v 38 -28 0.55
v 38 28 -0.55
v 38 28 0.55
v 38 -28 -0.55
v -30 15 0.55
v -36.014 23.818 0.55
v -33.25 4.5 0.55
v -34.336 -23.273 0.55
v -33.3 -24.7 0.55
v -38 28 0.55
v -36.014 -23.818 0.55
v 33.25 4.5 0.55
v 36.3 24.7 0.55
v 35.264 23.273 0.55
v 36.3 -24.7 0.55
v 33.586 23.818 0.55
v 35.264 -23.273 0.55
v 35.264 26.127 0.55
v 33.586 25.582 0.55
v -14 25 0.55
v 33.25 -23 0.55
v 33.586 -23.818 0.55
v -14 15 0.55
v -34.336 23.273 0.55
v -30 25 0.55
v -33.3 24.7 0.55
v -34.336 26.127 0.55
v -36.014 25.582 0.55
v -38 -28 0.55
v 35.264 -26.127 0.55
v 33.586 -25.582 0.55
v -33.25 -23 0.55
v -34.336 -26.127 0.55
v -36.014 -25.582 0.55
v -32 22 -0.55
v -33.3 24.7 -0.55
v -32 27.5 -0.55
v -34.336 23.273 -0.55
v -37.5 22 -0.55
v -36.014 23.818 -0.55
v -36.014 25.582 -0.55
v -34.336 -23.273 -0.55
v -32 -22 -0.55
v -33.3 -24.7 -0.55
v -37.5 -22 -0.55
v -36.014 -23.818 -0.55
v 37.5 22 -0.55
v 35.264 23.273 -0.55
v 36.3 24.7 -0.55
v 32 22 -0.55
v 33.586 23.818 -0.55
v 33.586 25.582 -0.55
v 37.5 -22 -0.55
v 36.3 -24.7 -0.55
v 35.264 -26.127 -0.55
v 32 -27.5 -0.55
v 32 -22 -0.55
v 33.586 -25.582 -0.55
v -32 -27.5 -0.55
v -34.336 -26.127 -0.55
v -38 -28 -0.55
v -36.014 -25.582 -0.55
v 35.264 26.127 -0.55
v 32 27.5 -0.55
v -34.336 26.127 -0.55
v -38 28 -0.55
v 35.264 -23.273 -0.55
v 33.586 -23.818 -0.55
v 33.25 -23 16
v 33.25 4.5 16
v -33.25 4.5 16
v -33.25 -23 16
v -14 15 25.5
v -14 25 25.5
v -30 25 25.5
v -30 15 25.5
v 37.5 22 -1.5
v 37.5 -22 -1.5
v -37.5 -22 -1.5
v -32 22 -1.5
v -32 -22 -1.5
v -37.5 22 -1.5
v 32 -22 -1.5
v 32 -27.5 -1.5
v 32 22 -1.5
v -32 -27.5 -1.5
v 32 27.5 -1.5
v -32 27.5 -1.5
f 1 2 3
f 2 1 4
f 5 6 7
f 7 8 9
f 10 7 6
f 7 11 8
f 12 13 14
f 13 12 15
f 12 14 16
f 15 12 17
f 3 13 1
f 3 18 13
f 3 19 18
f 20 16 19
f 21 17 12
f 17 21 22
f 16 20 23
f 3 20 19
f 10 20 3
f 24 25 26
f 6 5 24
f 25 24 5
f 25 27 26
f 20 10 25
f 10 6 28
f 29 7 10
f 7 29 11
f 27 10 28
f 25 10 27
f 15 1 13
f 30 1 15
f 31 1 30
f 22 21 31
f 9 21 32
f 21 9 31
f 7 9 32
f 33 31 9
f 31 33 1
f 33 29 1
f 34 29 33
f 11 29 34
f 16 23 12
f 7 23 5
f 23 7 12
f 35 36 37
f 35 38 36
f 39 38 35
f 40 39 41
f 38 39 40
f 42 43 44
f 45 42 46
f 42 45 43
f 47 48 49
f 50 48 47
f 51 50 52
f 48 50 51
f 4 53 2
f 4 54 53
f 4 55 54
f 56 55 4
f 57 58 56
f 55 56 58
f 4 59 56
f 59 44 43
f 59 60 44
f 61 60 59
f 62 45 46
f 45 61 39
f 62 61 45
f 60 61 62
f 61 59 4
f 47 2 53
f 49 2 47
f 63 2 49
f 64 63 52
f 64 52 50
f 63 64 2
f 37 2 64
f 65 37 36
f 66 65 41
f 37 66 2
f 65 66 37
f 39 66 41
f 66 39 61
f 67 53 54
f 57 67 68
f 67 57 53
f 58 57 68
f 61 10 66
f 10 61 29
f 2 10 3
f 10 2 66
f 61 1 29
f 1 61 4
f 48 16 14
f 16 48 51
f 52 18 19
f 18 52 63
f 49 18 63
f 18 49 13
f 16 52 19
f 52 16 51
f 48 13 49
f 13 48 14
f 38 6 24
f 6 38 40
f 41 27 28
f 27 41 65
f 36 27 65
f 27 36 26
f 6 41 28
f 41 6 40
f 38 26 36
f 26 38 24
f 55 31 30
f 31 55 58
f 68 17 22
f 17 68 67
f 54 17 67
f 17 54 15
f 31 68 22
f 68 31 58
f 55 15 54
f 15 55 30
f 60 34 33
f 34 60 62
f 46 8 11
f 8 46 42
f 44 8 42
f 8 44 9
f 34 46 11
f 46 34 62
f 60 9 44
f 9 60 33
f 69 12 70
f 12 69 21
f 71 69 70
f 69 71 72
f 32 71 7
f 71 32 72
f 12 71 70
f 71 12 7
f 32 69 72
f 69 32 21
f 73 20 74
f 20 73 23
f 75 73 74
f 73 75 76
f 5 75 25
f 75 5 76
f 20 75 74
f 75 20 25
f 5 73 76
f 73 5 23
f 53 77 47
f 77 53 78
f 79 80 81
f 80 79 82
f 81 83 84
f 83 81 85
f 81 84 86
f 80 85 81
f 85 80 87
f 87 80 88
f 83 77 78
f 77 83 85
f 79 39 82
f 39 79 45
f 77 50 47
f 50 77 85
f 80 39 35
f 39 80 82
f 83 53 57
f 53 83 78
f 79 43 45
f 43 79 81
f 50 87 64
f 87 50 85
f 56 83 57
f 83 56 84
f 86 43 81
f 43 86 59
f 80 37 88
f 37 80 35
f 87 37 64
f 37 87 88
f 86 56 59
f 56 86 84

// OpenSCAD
module hw_316() {
    //https://www.handsontec.com/dataspecs/4Ch-relay.pdf
    pcb=[76,56,1.1];
    holes=[69.6,49.4,3];
    relays=[66.5,27.5,15.5];
    
    union() {       
      // PCB-holes
      difference() {
        // PCB
        cube(pcb, center=true);           
        // holes
        translate([holes[0]/2,holes[1]/2,0])
          cylinder(h=2,r=holes[2]/2,center=true);
        translate([-holes[0]/2,holes[1]/2,0])
          cylinder(h=2,r=holes[2]/2,center=true);
        translate([holes[0]/2,-holes[1]/2,0])
          cylinder(h=2,r=holes[2]/2,center=true);
        translate([-holes[0]/2,-holes[1]/2,0])
          cylinder(h=2,r=holes[2]/2,center=true);
      }
      // relays
      translate([0,-(pcb[1]-relays[1])/2+5,relays[2]/2+0.5])
        cube(relays, center=true);
      // connectors
      translate([-22,20,13])
        cube([16,10,25], center=true);
      // bottom safe space
      translate([0,0,-1])
        cube([pcb[0]-1,pcb[1]-12,1], center=true);
      translate([0,0,-1])
        cube([pcb[0]-12,pcb[1]-1,1], center=true);
    }
}


color("#30AAAA")
  hw_316();
